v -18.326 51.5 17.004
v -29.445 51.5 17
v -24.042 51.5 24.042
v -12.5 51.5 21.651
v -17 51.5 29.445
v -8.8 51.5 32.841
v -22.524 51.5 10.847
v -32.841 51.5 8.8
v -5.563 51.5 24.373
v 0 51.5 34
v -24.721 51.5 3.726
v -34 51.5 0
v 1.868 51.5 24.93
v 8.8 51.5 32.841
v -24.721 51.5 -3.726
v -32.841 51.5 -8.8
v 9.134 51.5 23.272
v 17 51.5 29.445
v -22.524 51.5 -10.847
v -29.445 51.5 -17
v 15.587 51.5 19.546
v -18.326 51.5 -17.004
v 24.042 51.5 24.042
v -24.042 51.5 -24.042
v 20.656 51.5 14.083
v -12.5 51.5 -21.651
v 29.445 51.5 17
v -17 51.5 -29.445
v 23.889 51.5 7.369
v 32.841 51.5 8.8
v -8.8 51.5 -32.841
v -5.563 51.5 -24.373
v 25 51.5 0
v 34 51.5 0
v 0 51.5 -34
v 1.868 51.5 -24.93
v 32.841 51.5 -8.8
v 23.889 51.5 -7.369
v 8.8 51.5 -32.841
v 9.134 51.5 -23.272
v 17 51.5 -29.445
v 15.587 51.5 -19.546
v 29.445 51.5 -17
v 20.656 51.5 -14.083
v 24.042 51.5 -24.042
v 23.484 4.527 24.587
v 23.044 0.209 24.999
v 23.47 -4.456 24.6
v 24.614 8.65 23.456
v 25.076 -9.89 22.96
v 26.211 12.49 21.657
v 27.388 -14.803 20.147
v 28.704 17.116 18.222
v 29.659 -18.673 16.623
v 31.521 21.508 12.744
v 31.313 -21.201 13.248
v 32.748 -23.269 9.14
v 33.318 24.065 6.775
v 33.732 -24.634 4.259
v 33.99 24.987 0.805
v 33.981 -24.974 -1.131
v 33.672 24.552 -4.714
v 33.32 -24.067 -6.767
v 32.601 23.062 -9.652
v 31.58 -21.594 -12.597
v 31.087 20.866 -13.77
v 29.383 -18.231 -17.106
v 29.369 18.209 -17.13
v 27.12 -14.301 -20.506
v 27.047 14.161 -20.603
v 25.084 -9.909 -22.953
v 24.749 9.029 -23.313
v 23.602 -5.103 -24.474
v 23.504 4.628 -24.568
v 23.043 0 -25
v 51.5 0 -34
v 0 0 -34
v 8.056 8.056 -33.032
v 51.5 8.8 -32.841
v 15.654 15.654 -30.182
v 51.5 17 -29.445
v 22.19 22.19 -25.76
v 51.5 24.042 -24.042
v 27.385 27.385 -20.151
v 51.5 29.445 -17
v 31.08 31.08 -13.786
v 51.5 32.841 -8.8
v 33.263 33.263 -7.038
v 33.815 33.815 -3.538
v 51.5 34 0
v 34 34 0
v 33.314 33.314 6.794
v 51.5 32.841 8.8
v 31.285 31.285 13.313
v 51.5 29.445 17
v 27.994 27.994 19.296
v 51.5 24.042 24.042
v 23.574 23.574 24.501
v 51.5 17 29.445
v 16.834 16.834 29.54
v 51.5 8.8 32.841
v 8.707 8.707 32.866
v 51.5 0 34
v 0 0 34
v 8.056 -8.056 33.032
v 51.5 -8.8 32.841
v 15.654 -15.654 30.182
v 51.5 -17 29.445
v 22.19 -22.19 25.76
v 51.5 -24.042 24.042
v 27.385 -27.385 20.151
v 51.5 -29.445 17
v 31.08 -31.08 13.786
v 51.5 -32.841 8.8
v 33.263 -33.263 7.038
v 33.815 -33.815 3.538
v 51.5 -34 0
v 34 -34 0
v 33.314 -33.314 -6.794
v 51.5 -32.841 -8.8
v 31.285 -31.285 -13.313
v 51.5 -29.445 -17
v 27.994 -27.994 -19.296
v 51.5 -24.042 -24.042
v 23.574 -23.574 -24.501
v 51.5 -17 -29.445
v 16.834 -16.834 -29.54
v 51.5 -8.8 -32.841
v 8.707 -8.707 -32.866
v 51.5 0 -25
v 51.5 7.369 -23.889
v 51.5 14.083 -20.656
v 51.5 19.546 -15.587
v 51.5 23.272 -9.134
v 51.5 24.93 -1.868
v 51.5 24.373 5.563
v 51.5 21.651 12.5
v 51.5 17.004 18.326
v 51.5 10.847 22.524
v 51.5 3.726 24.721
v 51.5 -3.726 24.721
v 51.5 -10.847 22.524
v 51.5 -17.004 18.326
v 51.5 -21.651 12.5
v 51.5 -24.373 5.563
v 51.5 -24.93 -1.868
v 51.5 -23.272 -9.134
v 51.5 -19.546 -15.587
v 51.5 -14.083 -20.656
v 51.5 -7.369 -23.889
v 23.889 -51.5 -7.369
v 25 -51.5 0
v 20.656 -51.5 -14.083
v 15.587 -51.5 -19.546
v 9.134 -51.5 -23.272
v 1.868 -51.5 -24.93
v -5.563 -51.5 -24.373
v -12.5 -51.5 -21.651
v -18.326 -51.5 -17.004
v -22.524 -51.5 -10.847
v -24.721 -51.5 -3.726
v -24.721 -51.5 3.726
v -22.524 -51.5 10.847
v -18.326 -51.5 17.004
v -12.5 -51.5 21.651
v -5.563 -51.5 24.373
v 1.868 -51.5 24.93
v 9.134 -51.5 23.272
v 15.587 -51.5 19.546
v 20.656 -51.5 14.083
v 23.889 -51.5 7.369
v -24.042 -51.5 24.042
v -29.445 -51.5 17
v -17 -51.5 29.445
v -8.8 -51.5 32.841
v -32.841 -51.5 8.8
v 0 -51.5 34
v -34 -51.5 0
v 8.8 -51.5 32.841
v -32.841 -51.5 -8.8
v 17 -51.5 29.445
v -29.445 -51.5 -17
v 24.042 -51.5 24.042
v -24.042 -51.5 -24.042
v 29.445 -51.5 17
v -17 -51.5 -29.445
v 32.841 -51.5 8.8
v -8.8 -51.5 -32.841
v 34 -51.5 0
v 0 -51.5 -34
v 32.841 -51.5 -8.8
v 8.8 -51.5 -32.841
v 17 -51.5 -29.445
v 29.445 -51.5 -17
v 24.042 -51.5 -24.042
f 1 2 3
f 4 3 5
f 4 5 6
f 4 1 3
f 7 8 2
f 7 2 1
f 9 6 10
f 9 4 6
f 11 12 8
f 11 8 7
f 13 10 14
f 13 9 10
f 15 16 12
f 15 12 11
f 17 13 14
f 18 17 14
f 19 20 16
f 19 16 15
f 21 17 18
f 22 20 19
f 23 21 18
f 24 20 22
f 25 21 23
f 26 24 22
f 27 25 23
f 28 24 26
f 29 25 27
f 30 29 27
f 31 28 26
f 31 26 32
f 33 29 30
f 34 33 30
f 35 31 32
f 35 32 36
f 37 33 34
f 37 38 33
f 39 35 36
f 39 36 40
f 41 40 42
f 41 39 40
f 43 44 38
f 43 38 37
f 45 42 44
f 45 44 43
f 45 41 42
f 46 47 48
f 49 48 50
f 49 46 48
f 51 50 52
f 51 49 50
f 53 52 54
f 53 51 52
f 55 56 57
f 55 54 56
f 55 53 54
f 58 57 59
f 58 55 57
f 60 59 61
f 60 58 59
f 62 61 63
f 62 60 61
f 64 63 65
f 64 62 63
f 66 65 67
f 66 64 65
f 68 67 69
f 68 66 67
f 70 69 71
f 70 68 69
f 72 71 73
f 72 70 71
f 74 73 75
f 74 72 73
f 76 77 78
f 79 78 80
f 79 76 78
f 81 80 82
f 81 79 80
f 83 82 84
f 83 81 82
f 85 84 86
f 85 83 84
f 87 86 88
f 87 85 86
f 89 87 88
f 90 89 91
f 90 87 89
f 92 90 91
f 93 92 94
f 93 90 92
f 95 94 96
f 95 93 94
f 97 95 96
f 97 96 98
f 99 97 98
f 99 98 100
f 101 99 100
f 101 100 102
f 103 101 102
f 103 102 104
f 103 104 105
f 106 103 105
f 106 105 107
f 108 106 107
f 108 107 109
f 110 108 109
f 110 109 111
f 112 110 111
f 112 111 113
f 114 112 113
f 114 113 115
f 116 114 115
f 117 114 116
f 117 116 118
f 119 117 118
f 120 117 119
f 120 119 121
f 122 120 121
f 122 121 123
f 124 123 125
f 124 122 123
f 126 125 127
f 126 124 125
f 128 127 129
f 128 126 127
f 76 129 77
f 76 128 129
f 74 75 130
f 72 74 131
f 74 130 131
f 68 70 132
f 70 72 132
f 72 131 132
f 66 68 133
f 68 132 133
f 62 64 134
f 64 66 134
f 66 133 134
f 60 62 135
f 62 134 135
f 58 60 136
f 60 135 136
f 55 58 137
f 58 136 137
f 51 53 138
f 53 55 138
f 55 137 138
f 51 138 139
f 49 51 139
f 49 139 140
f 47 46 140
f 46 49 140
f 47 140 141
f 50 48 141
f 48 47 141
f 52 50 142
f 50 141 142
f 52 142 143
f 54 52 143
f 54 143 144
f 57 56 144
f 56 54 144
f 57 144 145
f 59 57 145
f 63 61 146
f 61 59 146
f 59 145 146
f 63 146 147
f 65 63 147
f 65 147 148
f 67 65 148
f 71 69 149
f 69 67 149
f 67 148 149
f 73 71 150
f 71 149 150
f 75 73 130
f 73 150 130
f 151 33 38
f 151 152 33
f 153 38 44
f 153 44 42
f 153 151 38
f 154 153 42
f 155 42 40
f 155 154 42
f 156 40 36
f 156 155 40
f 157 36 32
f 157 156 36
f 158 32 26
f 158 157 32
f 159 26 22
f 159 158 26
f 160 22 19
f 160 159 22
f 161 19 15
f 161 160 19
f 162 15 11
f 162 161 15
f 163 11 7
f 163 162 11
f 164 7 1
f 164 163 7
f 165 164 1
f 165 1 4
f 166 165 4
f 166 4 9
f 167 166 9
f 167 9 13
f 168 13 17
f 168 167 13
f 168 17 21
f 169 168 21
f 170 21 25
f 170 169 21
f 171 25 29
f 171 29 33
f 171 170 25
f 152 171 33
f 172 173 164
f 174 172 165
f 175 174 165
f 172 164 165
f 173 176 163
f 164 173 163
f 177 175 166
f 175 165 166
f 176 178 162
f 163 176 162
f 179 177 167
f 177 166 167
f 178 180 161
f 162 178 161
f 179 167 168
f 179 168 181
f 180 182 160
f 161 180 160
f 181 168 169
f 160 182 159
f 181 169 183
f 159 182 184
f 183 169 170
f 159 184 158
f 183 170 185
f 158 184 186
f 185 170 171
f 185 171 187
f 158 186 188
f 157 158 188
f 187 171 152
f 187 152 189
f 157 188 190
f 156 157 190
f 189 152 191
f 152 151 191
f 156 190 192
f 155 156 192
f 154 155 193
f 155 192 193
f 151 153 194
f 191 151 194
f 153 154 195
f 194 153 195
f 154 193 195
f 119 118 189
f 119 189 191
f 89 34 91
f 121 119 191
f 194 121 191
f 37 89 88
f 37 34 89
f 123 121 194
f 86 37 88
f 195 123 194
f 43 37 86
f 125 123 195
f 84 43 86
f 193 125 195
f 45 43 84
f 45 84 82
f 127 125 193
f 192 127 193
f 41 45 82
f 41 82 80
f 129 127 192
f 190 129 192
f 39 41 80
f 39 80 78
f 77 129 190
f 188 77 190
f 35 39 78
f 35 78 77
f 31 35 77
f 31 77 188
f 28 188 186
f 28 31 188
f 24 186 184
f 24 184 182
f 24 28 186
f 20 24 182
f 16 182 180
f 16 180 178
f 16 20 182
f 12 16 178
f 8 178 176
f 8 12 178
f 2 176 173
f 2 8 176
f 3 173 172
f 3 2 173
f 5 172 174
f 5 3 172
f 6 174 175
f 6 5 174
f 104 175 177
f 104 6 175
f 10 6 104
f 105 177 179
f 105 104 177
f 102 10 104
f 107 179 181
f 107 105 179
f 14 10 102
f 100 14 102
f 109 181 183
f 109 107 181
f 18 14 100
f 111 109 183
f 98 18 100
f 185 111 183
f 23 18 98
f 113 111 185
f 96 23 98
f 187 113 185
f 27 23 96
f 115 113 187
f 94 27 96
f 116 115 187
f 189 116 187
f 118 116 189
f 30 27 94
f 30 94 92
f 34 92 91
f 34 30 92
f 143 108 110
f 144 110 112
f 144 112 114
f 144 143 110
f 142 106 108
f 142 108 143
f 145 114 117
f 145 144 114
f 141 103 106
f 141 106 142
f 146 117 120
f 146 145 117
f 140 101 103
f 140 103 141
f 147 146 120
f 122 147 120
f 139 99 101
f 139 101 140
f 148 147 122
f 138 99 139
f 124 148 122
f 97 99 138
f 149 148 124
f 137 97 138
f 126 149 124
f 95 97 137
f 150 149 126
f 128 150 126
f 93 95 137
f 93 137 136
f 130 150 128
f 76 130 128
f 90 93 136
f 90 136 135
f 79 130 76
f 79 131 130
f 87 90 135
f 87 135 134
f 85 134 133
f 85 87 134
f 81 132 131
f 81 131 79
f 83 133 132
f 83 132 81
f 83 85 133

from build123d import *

# Parameters (mm, degrees)
SKETCH1_R           = 34
SKETCH1_R_2         = 25
BOSS_EXTRUDE1_DEPTH = 51.5
BOSS_EXTRUDE2_REACH = 87.5
SKETCH2_R           = 34
SKETCH2_R_2         = 25


with BuildPart() as part:
    # Sketch1 → Boss-Extrude1 (new body, symmetric)
    with BuildSketch(Plane(origin=(0, 0, 0), x_dir=(1, 0, 0), z_dir=(0, 1, 0))):
        Circle(SKETCH1_R)
        Circle(SKETCH1_R_2, mode=Mode.SUBTRACT)
    extrude(amount=BOSS_EXTRUDE1_DEPTH, both=True)

    # Sketch2 → Boss-Extrude2 (add, up to next)
    with BuildSketch(Plane(origin=(51.5, 0, 0), x_dir=(0, 0, -1), z_dir=(1, 0, 0)), mode=Mode.PRIVATE) as boss_extrude2_sk1:
        Circle(SKETCH2_R)
        Circle(SKETCH2_R_2, mode=Mode.SUBTRACT)
    boss_extrude2_tool1 = extrude(boss_extrude2_sk1.sketch, amount=-BOSS_EXTRUDE2_REACH, mode=Mode.PRIVATE) - part.part
    add(boss_extrude2_tool1.solids().sort_by_distance((51.5, 0, 33.038335))[0])


solid = part.part
